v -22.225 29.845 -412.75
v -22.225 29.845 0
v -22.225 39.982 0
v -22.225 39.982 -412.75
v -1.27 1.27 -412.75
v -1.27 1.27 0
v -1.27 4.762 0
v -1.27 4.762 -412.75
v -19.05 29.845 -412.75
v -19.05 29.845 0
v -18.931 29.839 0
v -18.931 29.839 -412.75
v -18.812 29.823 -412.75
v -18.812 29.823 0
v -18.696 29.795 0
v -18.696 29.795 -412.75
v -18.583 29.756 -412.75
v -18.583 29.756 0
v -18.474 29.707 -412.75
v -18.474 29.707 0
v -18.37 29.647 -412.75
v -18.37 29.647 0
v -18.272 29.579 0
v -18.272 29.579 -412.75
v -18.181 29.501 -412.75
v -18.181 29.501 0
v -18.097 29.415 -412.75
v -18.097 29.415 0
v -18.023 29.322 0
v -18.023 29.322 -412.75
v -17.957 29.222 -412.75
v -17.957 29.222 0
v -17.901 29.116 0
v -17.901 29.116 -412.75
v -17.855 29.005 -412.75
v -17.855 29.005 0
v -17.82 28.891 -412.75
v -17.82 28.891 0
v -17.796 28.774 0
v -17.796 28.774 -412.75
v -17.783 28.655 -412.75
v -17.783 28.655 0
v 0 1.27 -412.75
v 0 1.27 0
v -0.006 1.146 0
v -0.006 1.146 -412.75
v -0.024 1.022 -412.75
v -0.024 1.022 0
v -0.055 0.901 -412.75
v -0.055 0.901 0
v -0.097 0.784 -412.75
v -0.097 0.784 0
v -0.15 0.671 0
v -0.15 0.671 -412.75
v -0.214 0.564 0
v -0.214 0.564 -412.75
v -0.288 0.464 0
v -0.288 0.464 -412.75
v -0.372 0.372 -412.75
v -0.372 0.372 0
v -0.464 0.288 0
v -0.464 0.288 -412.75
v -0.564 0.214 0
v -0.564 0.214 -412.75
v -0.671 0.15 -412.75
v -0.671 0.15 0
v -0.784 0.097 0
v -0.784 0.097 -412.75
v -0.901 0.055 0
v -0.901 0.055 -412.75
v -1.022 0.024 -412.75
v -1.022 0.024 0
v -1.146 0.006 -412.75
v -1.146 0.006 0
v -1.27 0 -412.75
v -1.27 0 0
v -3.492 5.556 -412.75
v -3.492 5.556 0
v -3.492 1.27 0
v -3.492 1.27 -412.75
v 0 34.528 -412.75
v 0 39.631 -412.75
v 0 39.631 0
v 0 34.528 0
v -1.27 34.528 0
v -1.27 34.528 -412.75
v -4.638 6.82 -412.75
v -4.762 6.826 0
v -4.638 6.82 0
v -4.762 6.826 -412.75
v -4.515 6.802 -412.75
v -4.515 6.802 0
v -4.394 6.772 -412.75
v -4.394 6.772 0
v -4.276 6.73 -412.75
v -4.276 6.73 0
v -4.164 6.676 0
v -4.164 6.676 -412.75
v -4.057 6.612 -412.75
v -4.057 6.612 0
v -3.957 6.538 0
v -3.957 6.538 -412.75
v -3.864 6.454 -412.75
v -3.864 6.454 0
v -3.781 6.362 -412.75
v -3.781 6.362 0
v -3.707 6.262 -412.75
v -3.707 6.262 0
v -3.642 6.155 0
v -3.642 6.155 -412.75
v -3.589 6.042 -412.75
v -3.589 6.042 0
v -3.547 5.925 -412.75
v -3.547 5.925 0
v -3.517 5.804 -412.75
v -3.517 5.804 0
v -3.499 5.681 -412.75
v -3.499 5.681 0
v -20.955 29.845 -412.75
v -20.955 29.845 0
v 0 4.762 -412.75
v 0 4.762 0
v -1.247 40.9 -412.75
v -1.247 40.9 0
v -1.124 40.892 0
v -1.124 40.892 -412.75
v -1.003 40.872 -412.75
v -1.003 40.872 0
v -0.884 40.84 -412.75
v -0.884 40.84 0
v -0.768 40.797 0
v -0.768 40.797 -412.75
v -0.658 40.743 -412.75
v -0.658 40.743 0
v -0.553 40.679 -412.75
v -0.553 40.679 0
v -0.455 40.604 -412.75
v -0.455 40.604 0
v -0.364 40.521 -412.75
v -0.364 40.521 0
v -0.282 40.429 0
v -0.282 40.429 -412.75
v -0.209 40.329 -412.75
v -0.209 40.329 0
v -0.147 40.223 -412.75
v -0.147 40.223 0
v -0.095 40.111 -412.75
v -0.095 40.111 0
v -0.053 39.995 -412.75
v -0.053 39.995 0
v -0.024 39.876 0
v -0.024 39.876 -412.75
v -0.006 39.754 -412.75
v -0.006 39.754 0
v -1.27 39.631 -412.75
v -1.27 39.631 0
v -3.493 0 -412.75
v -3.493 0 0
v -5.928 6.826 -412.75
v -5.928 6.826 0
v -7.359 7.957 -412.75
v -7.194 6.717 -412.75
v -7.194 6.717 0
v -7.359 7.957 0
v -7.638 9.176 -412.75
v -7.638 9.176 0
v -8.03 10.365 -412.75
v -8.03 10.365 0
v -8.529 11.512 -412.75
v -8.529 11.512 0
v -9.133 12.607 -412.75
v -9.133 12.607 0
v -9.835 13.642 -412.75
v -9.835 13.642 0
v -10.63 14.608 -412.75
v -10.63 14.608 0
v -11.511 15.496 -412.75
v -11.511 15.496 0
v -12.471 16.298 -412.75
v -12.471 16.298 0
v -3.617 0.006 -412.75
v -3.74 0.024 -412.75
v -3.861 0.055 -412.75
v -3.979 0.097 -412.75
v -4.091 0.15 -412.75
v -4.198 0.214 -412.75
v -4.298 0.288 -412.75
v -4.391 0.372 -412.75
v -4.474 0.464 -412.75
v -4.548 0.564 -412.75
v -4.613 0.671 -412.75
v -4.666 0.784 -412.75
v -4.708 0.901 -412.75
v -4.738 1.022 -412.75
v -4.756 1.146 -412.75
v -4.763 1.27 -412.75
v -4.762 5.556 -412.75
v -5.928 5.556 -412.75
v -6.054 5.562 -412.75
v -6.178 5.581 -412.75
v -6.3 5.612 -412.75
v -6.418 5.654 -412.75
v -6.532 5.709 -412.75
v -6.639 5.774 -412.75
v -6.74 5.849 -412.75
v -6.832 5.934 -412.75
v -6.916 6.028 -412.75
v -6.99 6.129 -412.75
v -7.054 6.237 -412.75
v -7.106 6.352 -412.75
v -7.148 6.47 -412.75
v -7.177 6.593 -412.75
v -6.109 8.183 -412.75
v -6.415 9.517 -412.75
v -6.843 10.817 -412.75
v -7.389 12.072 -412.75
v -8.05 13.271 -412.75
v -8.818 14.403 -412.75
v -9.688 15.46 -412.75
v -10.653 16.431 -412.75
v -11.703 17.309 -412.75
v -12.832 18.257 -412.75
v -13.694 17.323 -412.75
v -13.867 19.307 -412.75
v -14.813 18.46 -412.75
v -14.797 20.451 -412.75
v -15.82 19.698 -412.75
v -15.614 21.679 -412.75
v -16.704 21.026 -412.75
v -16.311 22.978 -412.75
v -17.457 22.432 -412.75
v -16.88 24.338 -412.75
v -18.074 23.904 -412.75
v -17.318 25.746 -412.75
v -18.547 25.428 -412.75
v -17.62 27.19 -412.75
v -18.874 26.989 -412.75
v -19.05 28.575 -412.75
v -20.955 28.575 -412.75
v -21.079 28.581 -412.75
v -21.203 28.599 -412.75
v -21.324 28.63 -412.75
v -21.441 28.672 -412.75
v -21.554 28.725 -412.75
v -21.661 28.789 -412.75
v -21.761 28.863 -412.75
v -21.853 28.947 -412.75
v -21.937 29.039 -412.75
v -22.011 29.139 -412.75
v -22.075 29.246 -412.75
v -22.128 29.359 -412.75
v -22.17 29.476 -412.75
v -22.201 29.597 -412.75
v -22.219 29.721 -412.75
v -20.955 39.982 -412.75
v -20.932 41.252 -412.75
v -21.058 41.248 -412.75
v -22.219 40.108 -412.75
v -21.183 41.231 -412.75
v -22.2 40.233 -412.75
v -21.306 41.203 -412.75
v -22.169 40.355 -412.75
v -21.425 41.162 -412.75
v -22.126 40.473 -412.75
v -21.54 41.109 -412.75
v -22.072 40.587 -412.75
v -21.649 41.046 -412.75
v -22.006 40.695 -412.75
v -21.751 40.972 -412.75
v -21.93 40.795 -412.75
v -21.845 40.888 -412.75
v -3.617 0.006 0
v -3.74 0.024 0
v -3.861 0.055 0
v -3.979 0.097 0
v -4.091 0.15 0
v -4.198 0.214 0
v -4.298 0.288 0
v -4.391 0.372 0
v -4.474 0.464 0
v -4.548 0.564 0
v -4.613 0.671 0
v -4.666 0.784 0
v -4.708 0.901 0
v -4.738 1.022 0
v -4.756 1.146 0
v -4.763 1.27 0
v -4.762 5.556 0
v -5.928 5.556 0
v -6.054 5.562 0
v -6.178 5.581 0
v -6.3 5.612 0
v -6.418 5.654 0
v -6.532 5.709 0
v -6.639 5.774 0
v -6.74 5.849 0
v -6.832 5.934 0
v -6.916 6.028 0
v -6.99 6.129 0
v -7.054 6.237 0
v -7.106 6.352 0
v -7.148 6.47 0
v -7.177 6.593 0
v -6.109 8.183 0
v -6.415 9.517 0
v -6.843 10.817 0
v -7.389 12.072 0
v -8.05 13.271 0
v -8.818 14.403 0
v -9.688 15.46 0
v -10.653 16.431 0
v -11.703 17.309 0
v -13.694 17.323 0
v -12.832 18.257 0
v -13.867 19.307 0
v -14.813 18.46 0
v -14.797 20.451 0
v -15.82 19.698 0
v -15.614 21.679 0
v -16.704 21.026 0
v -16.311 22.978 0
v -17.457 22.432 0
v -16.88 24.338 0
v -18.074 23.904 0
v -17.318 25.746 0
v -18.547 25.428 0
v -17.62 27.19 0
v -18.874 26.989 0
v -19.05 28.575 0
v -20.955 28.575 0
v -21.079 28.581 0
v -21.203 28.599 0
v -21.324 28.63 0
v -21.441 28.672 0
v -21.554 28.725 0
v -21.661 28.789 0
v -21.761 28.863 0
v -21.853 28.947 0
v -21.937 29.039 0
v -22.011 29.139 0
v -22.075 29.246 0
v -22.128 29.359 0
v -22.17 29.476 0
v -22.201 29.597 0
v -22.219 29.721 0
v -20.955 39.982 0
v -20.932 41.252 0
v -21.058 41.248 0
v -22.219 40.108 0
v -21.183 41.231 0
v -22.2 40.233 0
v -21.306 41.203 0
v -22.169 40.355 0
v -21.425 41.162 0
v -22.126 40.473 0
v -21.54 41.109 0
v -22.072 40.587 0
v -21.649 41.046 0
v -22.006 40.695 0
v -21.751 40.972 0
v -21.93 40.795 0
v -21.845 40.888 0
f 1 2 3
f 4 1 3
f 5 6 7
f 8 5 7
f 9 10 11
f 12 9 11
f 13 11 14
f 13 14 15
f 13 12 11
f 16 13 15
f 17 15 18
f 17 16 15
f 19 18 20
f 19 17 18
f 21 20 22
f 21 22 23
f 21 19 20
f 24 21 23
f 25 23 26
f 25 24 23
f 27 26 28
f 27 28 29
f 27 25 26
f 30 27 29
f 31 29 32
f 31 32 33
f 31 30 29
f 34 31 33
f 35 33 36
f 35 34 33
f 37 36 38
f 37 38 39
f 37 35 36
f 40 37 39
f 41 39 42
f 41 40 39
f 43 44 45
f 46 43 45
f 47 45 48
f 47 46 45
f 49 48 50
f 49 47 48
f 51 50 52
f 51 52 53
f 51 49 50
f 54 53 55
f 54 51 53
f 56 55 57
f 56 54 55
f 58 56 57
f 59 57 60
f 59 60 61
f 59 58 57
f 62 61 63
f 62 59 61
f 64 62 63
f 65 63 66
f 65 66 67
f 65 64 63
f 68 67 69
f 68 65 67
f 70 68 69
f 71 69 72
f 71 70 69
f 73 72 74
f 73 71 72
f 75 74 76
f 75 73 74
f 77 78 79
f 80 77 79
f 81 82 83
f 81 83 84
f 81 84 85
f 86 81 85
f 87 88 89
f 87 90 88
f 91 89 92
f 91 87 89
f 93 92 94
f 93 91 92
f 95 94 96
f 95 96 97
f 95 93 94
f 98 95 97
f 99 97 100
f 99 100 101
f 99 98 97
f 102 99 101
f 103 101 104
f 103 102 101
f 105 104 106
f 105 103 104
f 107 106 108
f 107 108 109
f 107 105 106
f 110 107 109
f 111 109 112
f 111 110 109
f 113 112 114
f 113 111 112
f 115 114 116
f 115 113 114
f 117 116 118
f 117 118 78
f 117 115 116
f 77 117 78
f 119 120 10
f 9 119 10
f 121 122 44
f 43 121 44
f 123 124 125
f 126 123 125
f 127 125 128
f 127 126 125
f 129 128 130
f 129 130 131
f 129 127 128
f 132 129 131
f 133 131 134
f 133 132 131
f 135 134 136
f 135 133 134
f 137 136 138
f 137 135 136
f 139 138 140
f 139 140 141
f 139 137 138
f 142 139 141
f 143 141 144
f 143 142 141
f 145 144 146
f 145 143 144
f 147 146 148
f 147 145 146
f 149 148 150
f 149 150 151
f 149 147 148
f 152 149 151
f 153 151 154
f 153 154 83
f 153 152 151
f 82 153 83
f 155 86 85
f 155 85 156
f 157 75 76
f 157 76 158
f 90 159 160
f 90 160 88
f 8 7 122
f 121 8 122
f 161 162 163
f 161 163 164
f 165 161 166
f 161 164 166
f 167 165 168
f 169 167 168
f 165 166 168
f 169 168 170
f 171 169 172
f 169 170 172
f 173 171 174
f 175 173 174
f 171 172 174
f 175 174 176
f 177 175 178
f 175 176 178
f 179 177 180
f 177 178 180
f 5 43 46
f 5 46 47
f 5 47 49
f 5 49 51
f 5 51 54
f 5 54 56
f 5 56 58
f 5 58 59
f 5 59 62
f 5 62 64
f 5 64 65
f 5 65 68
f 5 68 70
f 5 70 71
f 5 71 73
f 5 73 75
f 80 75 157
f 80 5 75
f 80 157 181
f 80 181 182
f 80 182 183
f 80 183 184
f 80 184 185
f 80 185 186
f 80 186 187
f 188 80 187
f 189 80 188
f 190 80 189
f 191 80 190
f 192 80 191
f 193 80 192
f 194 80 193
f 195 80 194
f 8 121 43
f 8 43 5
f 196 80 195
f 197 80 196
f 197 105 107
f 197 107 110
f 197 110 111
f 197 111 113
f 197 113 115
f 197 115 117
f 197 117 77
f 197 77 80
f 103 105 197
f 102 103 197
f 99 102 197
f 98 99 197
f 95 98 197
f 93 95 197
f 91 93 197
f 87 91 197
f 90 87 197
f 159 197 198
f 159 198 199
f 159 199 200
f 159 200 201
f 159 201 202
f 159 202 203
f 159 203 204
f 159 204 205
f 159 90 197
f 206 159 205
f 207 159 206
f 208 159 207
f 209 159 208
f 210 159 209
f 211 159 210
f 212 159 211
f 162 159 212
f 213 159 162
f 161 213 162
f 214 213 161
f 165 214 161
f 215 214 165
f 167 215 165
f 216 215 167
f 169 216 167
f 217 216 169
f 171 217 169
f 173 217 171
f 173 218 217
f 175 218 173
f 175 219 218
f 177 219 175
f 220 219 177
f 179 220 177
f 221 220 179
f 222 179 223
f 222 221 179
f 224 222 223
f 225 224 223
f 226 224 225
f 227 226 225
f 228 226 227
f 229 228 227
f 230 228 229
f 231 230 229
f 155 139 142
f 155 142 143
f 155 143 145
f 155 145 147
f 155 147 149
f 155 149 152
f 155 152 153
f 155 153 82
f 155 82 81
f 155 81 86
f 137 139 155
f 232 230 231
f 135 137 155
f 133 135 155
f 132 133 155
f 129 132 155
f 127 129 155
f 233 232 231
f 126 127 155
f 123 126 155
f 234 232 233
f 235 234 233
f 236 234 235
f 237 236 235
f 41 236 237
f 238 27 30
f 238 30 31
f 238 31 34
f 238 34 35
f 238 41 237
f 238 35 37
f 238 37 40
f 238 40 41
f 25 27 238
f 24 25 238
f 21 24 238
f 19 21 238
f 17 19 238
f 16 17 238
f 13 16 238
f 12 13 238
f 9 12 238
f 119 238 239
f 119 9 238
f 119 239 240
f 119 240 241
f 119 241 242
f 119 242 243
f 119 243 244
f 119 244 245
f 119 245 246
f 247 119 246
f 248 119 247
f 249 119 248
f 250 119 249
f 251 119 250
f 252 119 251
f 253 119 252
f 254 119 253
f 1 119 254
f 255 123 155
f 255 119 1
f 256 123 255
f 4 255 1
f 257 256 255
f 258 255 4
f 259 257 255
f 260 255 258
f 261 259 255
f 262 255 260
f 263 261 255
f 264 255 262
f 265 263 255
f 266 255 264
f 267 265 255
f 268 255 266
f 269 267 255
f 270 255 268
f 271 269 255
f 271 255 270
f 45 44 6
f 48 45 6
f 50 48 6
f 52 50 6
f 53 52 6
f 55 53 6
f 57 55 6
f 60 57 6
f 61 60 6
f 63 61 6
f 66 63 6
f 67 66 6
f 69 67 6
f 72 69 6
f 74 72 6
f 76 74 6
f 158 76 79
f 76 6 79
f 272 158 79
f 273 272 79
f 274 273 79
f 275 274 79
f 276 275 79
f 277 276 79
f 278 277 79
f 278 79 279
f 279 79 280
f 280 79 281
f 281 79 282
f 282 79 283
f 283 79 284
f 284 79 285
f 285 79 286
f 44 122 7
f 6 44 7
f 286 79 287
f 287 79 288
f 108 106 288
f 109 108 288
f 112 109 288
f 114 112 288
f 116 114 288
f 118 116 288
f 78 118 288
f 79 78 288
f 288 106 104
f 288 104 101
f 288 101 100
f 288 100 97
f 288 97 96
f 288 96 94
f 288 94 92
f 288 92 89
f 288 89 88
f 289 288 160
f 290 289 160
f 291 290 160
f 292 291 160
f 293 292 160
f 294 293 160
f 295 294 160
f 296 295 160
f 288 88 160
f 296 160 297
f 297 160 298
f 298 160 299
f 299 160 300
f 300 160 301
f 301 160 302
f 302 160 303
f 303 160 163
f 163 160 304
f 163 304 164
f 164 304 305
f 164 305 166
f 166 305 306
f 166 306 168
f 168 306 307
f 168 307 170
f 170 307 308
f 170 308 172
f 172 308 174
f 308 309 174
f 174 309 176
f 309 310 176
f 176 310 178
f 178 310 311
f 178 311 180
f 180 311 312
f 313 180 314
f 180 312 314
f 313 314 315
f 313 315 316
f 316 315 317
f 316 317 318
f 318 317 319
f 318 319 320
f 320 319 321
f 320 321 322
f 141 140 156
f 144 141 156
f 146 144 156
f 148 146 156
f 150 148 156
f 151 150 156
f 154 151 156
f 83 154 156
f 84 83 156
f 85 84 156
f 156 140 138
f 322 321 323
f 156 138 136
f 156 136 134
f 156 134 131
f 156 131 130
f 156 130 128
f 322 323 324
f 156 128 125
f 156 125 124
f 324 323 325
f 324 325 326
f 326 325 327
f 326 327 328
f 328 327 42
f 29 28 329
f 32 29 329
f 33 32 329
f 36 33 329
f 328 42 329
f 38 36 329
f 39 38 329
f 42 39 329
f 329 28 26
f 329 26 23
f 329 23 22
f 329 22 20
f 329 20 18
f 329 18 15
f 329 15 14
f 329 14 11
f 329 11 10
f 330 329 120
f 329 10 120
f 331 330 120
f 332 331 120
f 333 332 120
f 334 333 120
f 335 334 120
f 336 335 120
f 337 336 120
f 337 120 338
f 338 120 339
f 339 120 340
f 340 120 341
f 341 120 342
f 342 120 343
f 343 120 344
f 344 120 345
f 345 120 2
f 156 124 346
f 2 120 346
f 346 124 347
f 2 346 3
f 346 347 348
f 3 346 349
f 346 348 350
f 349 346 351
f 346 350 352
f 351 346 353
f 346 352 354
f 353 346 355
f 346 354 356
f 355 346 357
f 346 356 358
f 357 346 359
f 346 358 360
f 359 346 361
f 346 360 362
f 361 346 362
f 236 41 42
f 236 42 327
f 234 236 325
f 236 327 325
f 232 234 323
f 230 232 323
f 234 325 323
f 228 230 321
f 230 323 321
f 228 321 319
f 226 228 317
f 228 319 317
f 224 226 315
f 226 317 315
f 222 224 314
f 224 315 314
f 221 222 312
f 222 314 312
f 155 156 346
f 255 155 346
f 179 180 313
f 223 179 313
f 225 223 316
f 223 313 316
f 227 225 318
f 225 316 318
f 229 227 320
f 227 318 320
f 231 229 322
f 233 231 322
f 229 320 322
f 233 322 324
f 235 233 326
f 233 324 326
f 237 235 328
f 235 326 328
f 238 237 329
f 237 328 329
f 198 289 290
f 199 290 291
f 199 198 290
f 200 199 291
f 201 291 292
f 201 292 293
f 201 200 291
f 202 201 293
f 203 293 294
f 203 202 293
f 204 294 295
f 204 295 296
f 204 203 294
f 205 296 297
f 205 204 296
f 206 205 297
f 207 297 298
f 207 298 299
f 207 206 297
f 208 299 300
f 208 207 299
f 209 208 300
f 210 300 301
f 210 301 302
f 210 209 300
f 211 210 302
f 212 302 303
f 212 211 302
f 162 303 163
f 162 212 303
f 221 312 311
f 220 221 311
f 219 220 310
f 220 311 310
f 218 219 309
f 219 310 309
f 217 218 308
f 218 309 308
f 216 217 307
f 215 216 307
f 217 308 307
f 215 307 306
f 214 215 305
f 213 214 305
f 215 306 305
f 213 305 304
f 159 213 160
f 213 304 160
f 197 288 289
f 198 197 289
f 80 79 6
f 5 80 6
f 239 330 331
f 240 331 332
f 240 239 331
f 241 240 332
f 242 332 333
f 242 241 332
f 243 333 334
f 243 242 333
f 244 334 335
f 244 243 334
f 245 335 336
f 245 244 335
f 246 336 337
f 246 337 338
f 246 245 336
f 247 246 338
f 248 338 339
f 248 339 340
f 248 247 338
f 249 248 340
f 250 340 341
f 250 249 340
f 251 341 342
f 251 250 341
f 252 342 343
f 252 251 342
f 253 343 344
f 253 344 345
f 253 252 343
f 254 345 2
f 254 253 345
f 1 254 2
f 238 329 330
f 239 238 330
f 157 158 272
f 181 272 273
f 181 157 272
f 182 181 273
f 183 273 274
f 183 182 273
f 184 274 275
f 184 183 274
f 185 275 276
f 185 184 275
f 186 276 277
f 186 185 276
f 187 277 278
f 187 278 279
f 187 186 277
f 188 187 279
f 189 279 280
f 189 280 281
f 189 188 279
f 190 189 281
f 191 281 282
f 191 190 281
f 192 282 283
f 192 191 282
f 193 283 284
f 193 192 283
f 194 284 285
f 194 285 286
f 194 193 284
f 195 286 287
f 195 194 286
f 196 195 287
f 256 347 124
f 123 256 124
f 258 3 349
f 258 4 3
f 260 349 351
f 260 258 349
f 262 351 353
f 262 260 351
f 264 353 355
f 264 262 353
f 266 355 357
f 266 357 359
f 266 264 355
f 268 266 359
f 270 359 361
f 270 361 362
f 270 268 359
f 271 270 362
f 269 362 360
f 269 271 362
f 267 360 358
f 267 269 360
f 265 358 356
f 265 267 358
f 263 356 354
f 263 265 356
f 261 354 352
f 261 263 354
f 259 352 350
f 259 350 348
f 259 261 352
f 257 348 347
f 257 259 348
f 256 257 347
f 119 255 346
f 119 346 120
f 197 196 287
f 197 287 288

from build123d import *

# Parameters (mm, degrees)
EXTRUDE_THIN1_DEPTH = 412.75
FILLET1_R           = 1.27


with BuildPart() as part:
    # Sketch1 → Extrude-Thin1 (new body)
    with BuildSketch(Plane.XY):
        with BuildLine():
            Line((0, 4.7625), (0, 0))
            Line((0, 0), (-4.7625, 0))
            Line((-4.7625, 0), (-4.7625, 5.55625))
            Line((-4.7625, 5.55625), (-7.14375, 5.55625))
            ThreePointArc((-7.14375, 5.55625), (-8.548737384, 11.551507081), (-12.471121185, 16.298295714))
            ThreePointArc((-12.471121185, 16.298295714), (-17.097302988, 21.720310148), (-19.05, 28.575))
            Line((-19.05, 28.575), (-22.225, 28.575))
            Line((-22.225, 28.575), (-22.225, 41.275))
            Line((-22.225, 41.275), (0, 40.878125))
            Line((0, 40.878125), (0, 34.528125))
            Line((0, 34.528125), (-1.27, 34.528125))
            Line((-1.27, 34.528125), (-1.27, 39.6306011))
            Line((-1.27, 39.6306011), (-20.955, 39.982118957))
            Line((-20.955, 39.982118957), (-20.955, 29.845))
            Line((-20.955, 29.845), (-17.811850471, 29.845))
            ThreePointArc((-17.811850471, 29.845), (-16.248920172, 22.850151694), (-11.702520826, 17.309311781))
            ThreePointArc((-11.702520826, 17.309311781), (-7.705625486, 12.679096033), (-5.928475081, 6.82625))
            Line((-5.928475081, 6.82625), (-3.4925, 6.82625))
            Line((-3.4925, 6.82625), (-3.4925, 1.27))
            Line((-3.4925, 1.27), (-1.27, 1.27))
            Line((-1.27, 1.27), (-1.27, 4.7625))
            Line((-1.27, 4.7625), (0, 4.7625))
        make_face()
    extrude(amount=-EXTRUDE_THIN1_DEPTH)

    # Fillet1
    fillet1_edges = [part.edges().sort_by_distance(p)[0] for p in [
        (-17.811850471, 29.845, -206.375),
        (-3.4925, 6.82625, -206.375),
        (0, 0, -206.375),
        (-4.7625, 0, -206.375),
        (-7.14375, 5.55625, -206.375),
        (-22.225, 28.575, -206.375),
        (-22.225, 41.275, -206.375),
        (0, 40.878125, -206.375),
    ]]
    fillet(fillet1_edges, radius=FILLET1_R)


solid = part.part
